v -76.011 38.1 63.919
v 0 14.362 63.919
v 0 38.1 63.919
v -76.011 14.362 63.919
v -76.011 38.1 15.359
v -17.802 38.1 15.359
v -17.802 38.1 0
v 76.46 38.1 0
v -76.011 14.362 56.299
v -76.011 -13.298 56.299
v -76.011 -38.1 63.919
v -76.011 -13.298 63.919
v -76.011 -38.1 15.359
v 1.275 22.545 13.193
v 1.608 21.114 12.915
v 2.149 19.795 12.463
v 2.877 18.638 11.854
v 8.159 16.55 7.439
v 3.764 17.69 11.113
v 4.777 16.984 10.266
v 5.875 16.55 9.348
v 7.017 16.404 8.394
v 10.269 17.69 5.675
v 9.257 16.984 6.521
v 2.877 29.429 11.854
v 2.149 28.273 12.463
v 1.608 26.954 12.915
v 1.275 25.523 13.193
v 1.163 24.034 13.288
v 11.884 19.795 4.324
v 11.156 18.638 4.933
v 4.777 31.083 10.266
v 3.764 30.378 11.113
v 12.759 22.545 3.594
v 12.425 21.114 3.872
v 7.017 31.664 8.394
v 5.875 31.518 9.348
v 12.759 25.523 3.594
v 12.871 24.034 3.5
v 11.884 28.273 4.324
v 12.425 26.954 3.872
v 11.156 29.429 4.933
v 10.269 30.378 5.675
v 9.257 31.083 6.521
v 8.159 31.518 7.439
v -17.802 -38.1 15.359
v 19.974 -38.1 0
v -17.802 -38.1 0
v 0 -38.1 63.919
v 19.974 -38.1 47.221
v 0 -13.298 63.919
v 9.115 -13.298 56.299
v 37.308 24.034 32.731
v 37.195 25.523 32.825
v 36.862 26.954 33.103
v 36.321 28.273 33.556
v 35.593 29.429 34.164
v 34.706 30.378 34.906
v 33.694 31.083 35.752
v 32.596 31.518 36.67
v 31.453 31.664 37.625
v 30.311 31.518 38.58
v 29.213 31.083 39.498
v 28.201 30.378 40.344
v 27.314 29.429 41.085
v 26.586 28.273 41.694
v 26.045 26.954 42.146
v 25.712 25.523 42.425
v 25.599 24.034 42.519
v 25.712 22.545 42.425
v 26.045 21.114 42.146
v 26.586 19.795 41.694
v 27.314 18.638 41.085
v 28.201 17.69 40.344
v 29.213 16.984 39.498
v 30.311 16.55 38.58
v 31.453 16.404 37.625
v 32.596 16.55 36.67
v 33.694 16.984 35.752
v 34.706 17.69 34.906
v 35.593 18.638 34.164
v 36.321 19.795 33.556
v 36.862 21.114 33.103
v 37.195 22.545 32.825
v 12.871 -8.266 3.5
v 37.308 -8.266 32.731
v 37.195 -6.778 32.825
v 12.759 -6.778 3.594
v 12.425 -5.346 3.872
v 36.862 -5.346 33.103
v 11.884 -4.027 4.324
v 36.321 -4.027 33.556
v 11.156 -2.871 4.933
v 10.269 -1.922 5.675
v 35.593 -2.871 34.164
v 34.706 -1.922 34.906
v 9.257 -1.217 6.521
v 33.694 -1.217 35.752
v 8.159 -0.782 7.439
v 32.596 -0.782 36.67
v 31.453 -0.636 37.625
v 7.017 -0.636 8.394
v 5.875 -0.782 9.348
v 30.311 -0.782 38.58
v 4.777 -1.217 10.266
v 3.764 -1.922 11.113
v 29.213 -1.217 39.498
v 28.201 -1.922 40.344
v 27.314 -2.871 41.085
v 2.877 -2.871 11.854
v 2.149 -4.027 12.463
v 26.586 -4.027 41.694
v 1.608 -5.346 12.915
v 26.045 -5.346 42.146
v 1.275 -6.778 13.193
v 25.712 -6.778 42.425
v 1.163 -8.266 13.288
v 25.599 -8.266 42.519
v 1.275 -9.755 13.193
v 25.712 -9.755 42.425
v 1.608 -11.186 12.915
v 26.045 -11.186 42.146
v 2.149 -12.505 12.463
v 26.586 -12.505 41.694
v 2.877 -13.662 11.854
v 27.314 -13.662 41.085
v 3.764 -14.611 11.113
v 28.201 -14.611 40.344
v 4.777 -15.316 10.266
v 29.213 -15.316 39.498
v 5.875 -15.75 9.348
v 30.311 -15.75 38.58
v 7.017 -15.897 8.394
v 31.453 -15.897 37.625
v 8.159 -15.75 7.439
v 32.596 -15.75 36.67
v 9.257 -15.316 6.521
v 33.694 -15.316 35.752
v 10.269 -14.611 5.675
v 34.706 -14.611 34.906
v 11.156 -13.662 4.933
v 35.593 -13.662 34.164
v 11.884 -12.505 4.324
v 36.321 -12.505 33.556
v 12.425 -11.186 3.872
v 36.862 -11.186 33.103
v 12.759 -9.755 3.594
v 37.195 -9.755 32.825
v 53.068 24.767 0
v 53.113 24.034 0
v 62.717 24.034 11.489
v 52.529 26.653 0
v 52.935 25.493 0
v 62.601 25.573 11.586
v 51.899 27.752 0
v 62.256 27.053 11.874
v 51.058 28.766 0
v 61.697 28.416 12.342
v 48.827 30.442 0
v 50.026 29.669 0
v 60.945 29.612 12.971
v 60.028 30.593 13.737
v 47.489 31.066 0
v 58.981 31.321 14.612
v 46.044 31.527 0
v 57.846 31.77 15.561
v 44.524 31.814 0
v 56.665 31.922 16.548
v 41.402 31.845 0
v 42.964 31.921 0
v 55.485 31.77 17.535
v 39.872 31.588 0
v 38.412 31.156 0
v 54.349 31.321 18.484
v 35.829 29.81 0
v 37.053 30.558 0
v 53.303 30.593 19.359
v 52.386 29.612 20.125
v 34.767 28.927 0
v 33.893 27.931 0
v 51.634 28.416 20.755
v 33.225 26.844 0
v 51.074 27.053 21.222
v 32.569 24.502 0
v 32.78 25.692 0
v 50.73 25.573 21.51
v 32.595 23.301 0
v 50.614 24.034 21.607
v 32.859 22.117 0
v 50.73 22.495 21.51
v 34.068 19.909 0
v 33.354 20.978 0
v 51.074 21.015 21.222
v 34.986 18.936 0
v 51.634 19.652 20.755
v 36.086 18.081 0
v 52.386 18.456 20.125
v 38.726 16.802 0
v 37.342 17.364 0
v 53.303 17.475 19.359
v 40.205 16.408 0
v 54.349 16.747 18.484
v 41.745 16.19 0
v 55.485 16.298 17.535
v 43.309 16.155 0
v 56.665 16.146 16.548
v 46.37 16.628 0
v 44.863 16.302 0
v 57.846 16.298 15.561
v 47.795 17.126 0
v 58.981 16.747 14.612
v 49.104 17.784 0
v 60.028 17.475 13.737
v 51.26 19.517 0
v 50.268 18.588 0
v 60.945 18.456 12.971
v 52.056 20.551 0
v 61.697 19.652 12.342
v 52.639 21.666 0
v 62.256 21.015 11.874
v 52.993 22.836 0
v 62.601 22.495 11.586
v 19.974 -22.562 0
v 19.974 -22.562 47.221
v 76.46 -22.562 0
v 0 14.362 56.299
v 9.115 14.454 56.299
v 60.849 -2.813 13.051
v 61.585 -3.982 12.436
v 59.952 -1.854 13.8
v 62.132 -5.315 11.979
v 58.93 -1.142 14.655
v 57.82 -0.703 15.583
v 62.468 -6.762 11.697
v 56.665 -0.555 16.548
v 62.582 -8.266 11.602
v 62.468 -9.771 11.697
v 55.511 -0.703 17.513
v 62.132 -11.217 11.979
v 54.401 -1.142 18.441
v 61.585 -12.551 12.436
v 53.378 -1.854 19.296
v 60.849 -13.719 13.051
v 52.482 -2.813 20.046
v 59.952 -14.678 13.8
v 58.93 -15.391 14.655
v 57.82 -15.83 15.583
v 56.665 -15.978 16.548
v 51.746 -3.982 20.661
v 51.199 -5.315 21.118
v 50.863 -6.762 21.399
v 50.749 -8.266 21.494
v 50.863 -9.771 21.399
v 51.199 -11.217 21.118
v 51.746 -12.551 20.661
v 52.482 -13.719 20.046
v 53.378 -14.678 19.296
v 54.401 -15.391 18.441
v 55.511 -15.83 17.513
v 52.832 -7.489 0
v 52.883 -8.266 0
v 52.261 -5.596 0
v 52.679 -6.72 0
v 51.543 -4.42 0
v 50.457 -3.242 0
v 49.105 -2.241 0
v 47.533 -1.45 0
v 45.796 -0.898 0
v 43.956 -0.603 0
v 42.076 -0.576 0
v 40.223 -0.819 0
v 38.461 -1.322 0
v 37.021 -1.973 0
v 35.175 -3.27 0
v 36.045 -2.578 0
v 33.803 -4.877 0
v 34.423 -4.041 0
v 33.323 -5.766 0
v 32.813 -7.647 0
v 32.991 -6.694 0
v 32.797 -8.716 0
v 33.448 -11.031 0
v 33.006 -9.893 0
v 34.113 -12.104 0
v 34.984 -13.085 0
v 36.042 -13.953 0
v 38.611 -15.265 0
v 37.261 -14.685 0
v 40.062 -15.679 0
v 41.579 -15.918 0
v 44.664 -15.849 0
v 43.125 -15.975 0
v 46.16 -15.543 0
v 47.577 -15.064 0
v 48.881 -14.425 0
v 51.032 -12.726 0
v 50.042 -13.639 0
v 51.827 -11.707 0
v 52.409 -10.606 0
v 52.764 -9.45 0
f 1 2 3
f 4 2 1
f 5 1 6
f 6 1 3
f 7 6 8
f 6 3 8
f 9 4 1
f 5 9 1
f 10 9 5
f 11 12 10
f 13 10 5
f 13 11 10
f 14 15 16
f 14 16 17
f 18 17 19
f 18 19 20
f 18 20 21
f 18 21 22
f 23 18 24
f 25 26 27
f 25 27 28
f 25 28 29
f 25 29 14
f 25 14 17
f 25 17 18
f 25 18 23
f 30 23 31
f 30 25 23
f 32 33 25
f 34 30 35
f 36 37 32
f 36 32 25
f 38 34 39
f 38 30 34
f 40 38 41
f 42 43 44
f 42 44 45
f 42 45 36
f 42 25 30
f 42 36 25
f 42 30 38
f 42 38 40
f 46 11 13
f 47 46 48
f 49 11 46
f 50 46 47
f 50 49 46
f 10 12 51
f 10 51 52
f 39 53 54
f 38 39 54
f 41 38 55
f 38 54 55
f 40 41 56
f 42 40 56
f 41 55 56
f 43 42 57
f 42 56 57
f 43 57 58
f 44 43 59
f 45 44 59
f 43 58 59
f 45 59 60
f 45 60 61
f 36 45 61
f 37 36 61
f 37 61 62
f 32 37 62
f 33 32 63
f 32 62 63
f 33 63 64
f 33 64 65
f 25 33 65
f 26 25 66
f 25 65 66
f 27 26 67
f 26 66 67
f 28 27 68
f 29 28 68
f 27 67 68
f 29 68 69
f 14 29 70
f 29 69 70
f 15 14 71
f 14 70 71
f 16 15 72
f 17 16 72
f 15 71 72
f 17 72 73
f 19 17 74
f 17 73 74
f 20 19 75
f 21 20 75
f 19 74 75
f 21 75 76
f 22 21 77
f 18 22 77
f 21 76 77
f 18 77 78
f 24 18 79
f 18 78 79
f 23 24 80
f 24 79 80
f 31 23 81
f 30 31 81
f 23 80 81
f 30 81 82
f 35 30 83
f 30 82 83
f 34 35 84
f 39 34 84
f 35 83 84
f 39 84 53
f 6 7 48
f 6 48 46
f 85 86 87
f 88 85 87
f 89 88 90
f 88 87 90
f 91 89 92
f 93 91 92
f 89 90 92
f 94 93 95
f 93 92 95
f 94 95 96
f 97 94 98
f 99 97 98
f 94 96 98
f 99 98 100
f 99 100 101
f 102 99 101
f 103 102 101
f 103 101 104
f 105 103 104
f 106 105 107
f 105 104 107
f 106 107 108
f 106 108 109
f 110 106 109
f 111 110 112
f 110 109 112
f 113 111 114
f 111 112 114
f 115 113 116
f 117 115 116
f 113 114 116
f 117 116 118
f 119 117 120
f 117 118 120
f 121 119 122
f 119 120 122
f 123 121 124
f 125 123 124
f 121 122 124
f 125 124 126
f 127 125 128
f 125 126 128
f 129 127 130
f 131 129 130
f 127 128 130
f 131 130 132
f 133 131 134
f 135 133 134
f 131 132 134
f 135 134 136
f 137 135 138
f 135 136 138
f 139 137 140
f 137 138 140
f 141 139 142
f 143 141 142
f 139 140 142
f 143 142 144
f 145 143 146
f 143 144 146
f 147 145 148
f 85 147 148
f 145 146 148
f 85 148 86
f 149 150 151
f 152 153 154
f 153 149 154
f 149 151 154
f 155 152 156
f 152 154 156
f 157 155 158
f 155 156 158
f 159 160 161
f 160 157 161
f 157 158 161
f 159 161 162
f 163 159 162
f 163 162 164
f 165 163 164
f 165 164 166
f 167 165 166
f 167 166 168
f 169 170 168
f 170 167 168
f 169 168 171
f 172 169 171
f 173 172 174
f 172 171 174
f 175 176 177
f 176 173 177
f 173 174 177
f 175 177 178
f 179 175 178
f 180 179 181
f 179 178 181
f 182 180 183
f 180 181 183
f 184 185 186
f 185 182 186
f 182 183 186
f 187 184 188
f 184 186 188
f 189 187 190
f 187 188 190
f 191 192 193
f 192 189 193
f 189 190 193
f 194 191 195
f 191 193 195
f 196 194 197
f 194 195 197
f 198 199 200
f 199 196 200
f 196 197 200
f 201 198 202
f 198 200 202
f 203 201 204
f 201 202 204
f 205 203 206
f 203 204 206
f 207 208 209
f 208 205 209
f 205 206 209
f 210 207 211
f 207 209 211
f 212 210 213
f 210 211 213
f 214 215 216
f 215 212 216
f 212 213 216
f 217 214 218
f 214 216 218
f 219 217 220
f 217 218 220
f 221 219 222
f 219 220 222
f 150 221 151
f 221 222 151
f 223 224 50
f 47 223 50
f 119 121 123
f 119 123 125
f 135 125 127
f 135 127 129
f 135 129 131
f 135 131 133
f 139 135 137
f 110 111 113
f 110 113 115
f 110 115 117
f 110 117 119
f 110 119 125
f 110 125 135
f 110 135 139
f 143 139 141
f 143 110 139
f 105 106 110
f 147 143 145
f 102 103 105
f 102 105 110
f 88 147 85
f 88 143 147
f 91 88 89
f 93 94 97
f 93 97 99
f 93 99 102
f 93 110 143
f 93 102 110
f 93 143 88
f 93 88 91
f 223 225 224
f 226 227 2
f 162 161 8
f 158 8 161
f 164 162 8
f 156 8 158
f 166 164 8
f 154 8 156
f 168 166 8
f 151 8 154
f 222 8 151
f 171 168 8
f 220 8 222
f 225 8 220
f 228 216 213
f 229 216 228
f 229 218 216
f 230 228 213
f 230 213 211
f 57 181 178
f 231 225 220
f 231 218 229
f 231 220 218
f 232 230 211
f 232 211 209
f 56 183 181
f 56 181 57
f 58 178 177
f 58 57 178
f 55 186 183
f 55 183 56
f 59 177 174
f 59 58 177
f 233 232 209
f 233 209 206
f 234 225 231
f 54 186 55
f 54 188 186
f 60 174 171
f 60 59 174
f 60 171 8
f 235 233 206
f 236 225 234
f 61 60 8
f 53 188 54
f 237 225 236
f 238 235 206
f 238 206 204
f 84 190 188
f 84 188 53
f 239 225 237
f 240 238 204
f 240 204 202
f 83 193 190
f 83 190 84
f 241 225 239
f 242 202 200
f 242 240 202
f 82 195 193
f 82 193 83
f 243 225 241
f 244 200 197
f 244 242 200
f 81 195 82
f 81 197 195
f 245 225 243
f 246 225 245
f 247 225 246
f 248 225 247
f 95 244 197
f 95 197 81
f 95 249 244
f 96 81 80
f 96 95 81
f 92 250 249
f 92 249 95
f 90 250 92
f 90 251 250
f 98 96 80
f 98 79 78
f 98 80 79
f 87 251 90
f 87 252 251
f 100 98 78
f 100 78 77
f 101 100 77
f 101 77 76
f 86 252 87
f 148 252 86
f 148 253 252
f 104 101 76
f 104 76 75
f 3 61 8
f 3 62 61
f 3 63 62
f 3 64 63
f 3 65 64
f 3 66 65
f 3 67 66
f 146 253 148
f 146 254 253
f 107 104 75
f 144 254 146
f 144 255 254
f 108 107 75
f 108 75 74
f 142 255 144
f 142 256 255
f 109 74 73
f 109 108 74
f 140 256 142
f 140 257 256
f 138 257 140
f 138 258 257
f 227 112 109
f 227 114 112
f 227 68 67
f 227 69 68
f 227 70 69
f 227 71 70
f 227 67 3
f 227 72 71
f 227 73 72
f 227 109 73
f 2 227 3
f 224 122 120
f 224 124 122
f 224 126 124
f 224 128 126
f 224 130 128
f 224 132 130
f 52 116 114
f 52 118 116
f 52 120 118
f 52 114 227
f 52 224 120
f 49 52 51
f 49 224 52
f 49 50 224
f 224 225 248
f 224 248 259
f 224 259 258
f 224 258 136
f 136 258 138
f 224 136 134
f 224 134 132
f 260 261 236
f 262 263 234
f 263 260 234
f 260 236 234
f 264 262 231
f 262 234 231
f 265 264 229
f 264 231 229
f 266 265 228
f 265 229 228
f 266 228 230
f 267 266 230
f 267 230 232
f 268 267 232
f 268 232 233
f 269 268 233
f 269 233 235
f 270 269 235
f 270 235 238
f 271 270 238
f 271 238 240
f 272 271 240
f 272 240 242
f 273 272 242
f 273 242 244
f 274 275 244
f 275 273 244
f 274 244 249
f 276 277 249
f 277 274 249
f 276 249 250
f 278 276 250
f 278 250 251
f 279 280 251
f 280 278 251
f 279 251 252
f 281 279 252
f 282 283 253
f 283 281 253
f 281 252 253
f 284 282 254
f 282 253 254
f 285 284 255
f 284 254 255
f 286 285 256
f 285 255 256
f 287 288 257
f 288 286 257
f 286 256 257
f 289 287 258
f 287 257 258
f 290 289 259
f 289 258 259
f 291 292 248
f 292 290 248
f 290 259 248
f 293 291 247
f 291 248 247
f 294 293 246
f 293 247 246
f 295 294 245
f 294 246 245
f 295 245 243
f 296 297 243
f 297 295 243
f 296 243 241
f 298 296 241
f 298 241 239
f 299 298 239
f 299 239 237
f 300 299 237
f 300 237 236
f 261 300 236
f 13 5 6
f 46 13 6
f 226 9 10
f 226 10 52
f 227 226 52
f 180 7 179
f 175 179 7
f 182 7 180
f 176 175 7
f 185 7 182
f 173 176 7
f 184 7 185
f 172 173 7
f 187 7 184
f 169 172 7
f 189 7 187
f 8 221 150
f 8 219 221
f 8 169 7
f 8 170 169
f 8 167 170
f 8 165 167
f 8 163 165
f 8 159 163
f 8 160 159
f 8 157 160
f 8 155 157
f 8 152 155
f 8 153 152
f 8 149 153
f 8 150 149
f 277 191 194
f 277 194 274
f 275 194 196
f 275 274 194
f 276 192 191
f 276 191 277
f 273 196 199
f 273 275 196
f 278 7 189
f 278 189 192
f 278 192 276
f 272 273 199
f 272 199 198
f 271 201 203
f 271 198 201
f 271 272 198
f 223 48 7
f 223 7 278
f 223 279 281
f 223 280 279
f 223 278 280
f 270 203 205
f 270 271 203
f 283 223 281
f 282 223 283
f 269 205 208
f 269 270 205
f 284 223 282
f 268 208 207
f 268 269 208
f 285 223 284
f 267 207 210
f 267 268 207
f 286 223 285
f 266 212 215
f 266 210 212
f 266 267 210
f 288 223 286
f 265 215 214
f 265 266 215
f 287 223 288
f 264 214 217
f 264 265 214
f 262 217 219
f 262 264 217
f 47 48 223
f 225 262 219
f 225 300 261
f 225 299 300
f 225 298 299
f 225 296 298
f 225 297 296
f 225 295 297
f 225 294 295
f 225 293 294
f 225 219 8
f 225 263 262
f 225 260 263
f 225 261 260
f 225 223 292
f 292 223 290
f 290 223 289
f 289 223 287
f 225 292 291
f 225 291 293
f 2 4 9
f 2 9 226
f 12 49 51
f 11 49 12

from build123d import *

# Parameters (mm, degrees)
F1_DEPTH = 38.1
F2_W     = 58.2091789693
F2_H     = 15.3594079479
F3_DEPTH = 76.2
F5_DEPTH = 50.8
F6_W     = 76.010748744
F6_H     = 27.6595102623
F7_DEPTH = 7.62
F8_R     = 7.6303567528
F8_R_2   = 7.7116101736
F8_R_3   = 7.8878838381
F9_DEPTH = 38.1


with BuildPart() as f1:
    # F0 (on Front) → F1 (new body, symmetric)
    with BuildSketch(Plane.XZ):
        Polygon((-76.010748744, 63.9190971851), (-76.010748744, 0), (0, 0), (76.4603540301, 0), (0, 63.9190971851), align=None)
    extrude(amount=F1_DEPTH, both=True)

    # F2 (on face) → F3 (cut, symmetric)
    with BuildSketch(Plane.XZ.offset(38.1)):
        with Locations((-46.9061592594, 7.679703974)):
            Rectangle(F2_W, F2_H)
    extrude(amount=F3_DEPTH, both=True, mode=Mode.SUBTRACT)

    # F4 (on Top) → F5 (cut, symmetric)
    with BuildSketch(Plane.XY):
        Polygon((19.974257797, -22.5624050945), (19.974257797, -38.3158996701), (76.5146613121, -38.1380990148), (76.5146613121, -22.5624050945), align=None)
    extrude(amount=F5_DEPTH, both=True, mode=Mode.SUBTRACT)

    # F6 (on face) → F7 (cut)
    with BuildSketch(Plane.XY.offset(63.9190971851)):
        with Locations((-38.005374372, 0.5322289653)):
            Rectangle(F6_W, F6_H)
        Polygon((0, 14.3619840965), (0, -13.2975261658), (15.1856476441, -13.2975261658), (15.1856476441, 14.5155396312), align=None)
    extrude(amount=-F7_DEPTH, mode=Mode.SUBTRACT)

    # F8 (on face) → F9 (cut, symmetric)
    with BuildSketch(Plane(origin=(31.4534289532, 0, 37.6247540897), x_dir=(0.7672228325, 0, -0.6413806399), z_dir=(0.6413806399, 0, 0.7672228325))):
        with Locations((0, -8.2661788911)):
            Circle(F8_R)
        with Locations((32.8613109887, -8.2661788911)):
            Circle(F8_R_2)
        with Locations((0, 24.0339674056)):
            Circle(F8_R)
        with Locations((32.8613109887, 24.0339674056)):
            Circle(F8_R_3)
    extrude(amount=F9_DEPTH, both=True, mode=Mode.SUBTRACT)


solid = f1.part
